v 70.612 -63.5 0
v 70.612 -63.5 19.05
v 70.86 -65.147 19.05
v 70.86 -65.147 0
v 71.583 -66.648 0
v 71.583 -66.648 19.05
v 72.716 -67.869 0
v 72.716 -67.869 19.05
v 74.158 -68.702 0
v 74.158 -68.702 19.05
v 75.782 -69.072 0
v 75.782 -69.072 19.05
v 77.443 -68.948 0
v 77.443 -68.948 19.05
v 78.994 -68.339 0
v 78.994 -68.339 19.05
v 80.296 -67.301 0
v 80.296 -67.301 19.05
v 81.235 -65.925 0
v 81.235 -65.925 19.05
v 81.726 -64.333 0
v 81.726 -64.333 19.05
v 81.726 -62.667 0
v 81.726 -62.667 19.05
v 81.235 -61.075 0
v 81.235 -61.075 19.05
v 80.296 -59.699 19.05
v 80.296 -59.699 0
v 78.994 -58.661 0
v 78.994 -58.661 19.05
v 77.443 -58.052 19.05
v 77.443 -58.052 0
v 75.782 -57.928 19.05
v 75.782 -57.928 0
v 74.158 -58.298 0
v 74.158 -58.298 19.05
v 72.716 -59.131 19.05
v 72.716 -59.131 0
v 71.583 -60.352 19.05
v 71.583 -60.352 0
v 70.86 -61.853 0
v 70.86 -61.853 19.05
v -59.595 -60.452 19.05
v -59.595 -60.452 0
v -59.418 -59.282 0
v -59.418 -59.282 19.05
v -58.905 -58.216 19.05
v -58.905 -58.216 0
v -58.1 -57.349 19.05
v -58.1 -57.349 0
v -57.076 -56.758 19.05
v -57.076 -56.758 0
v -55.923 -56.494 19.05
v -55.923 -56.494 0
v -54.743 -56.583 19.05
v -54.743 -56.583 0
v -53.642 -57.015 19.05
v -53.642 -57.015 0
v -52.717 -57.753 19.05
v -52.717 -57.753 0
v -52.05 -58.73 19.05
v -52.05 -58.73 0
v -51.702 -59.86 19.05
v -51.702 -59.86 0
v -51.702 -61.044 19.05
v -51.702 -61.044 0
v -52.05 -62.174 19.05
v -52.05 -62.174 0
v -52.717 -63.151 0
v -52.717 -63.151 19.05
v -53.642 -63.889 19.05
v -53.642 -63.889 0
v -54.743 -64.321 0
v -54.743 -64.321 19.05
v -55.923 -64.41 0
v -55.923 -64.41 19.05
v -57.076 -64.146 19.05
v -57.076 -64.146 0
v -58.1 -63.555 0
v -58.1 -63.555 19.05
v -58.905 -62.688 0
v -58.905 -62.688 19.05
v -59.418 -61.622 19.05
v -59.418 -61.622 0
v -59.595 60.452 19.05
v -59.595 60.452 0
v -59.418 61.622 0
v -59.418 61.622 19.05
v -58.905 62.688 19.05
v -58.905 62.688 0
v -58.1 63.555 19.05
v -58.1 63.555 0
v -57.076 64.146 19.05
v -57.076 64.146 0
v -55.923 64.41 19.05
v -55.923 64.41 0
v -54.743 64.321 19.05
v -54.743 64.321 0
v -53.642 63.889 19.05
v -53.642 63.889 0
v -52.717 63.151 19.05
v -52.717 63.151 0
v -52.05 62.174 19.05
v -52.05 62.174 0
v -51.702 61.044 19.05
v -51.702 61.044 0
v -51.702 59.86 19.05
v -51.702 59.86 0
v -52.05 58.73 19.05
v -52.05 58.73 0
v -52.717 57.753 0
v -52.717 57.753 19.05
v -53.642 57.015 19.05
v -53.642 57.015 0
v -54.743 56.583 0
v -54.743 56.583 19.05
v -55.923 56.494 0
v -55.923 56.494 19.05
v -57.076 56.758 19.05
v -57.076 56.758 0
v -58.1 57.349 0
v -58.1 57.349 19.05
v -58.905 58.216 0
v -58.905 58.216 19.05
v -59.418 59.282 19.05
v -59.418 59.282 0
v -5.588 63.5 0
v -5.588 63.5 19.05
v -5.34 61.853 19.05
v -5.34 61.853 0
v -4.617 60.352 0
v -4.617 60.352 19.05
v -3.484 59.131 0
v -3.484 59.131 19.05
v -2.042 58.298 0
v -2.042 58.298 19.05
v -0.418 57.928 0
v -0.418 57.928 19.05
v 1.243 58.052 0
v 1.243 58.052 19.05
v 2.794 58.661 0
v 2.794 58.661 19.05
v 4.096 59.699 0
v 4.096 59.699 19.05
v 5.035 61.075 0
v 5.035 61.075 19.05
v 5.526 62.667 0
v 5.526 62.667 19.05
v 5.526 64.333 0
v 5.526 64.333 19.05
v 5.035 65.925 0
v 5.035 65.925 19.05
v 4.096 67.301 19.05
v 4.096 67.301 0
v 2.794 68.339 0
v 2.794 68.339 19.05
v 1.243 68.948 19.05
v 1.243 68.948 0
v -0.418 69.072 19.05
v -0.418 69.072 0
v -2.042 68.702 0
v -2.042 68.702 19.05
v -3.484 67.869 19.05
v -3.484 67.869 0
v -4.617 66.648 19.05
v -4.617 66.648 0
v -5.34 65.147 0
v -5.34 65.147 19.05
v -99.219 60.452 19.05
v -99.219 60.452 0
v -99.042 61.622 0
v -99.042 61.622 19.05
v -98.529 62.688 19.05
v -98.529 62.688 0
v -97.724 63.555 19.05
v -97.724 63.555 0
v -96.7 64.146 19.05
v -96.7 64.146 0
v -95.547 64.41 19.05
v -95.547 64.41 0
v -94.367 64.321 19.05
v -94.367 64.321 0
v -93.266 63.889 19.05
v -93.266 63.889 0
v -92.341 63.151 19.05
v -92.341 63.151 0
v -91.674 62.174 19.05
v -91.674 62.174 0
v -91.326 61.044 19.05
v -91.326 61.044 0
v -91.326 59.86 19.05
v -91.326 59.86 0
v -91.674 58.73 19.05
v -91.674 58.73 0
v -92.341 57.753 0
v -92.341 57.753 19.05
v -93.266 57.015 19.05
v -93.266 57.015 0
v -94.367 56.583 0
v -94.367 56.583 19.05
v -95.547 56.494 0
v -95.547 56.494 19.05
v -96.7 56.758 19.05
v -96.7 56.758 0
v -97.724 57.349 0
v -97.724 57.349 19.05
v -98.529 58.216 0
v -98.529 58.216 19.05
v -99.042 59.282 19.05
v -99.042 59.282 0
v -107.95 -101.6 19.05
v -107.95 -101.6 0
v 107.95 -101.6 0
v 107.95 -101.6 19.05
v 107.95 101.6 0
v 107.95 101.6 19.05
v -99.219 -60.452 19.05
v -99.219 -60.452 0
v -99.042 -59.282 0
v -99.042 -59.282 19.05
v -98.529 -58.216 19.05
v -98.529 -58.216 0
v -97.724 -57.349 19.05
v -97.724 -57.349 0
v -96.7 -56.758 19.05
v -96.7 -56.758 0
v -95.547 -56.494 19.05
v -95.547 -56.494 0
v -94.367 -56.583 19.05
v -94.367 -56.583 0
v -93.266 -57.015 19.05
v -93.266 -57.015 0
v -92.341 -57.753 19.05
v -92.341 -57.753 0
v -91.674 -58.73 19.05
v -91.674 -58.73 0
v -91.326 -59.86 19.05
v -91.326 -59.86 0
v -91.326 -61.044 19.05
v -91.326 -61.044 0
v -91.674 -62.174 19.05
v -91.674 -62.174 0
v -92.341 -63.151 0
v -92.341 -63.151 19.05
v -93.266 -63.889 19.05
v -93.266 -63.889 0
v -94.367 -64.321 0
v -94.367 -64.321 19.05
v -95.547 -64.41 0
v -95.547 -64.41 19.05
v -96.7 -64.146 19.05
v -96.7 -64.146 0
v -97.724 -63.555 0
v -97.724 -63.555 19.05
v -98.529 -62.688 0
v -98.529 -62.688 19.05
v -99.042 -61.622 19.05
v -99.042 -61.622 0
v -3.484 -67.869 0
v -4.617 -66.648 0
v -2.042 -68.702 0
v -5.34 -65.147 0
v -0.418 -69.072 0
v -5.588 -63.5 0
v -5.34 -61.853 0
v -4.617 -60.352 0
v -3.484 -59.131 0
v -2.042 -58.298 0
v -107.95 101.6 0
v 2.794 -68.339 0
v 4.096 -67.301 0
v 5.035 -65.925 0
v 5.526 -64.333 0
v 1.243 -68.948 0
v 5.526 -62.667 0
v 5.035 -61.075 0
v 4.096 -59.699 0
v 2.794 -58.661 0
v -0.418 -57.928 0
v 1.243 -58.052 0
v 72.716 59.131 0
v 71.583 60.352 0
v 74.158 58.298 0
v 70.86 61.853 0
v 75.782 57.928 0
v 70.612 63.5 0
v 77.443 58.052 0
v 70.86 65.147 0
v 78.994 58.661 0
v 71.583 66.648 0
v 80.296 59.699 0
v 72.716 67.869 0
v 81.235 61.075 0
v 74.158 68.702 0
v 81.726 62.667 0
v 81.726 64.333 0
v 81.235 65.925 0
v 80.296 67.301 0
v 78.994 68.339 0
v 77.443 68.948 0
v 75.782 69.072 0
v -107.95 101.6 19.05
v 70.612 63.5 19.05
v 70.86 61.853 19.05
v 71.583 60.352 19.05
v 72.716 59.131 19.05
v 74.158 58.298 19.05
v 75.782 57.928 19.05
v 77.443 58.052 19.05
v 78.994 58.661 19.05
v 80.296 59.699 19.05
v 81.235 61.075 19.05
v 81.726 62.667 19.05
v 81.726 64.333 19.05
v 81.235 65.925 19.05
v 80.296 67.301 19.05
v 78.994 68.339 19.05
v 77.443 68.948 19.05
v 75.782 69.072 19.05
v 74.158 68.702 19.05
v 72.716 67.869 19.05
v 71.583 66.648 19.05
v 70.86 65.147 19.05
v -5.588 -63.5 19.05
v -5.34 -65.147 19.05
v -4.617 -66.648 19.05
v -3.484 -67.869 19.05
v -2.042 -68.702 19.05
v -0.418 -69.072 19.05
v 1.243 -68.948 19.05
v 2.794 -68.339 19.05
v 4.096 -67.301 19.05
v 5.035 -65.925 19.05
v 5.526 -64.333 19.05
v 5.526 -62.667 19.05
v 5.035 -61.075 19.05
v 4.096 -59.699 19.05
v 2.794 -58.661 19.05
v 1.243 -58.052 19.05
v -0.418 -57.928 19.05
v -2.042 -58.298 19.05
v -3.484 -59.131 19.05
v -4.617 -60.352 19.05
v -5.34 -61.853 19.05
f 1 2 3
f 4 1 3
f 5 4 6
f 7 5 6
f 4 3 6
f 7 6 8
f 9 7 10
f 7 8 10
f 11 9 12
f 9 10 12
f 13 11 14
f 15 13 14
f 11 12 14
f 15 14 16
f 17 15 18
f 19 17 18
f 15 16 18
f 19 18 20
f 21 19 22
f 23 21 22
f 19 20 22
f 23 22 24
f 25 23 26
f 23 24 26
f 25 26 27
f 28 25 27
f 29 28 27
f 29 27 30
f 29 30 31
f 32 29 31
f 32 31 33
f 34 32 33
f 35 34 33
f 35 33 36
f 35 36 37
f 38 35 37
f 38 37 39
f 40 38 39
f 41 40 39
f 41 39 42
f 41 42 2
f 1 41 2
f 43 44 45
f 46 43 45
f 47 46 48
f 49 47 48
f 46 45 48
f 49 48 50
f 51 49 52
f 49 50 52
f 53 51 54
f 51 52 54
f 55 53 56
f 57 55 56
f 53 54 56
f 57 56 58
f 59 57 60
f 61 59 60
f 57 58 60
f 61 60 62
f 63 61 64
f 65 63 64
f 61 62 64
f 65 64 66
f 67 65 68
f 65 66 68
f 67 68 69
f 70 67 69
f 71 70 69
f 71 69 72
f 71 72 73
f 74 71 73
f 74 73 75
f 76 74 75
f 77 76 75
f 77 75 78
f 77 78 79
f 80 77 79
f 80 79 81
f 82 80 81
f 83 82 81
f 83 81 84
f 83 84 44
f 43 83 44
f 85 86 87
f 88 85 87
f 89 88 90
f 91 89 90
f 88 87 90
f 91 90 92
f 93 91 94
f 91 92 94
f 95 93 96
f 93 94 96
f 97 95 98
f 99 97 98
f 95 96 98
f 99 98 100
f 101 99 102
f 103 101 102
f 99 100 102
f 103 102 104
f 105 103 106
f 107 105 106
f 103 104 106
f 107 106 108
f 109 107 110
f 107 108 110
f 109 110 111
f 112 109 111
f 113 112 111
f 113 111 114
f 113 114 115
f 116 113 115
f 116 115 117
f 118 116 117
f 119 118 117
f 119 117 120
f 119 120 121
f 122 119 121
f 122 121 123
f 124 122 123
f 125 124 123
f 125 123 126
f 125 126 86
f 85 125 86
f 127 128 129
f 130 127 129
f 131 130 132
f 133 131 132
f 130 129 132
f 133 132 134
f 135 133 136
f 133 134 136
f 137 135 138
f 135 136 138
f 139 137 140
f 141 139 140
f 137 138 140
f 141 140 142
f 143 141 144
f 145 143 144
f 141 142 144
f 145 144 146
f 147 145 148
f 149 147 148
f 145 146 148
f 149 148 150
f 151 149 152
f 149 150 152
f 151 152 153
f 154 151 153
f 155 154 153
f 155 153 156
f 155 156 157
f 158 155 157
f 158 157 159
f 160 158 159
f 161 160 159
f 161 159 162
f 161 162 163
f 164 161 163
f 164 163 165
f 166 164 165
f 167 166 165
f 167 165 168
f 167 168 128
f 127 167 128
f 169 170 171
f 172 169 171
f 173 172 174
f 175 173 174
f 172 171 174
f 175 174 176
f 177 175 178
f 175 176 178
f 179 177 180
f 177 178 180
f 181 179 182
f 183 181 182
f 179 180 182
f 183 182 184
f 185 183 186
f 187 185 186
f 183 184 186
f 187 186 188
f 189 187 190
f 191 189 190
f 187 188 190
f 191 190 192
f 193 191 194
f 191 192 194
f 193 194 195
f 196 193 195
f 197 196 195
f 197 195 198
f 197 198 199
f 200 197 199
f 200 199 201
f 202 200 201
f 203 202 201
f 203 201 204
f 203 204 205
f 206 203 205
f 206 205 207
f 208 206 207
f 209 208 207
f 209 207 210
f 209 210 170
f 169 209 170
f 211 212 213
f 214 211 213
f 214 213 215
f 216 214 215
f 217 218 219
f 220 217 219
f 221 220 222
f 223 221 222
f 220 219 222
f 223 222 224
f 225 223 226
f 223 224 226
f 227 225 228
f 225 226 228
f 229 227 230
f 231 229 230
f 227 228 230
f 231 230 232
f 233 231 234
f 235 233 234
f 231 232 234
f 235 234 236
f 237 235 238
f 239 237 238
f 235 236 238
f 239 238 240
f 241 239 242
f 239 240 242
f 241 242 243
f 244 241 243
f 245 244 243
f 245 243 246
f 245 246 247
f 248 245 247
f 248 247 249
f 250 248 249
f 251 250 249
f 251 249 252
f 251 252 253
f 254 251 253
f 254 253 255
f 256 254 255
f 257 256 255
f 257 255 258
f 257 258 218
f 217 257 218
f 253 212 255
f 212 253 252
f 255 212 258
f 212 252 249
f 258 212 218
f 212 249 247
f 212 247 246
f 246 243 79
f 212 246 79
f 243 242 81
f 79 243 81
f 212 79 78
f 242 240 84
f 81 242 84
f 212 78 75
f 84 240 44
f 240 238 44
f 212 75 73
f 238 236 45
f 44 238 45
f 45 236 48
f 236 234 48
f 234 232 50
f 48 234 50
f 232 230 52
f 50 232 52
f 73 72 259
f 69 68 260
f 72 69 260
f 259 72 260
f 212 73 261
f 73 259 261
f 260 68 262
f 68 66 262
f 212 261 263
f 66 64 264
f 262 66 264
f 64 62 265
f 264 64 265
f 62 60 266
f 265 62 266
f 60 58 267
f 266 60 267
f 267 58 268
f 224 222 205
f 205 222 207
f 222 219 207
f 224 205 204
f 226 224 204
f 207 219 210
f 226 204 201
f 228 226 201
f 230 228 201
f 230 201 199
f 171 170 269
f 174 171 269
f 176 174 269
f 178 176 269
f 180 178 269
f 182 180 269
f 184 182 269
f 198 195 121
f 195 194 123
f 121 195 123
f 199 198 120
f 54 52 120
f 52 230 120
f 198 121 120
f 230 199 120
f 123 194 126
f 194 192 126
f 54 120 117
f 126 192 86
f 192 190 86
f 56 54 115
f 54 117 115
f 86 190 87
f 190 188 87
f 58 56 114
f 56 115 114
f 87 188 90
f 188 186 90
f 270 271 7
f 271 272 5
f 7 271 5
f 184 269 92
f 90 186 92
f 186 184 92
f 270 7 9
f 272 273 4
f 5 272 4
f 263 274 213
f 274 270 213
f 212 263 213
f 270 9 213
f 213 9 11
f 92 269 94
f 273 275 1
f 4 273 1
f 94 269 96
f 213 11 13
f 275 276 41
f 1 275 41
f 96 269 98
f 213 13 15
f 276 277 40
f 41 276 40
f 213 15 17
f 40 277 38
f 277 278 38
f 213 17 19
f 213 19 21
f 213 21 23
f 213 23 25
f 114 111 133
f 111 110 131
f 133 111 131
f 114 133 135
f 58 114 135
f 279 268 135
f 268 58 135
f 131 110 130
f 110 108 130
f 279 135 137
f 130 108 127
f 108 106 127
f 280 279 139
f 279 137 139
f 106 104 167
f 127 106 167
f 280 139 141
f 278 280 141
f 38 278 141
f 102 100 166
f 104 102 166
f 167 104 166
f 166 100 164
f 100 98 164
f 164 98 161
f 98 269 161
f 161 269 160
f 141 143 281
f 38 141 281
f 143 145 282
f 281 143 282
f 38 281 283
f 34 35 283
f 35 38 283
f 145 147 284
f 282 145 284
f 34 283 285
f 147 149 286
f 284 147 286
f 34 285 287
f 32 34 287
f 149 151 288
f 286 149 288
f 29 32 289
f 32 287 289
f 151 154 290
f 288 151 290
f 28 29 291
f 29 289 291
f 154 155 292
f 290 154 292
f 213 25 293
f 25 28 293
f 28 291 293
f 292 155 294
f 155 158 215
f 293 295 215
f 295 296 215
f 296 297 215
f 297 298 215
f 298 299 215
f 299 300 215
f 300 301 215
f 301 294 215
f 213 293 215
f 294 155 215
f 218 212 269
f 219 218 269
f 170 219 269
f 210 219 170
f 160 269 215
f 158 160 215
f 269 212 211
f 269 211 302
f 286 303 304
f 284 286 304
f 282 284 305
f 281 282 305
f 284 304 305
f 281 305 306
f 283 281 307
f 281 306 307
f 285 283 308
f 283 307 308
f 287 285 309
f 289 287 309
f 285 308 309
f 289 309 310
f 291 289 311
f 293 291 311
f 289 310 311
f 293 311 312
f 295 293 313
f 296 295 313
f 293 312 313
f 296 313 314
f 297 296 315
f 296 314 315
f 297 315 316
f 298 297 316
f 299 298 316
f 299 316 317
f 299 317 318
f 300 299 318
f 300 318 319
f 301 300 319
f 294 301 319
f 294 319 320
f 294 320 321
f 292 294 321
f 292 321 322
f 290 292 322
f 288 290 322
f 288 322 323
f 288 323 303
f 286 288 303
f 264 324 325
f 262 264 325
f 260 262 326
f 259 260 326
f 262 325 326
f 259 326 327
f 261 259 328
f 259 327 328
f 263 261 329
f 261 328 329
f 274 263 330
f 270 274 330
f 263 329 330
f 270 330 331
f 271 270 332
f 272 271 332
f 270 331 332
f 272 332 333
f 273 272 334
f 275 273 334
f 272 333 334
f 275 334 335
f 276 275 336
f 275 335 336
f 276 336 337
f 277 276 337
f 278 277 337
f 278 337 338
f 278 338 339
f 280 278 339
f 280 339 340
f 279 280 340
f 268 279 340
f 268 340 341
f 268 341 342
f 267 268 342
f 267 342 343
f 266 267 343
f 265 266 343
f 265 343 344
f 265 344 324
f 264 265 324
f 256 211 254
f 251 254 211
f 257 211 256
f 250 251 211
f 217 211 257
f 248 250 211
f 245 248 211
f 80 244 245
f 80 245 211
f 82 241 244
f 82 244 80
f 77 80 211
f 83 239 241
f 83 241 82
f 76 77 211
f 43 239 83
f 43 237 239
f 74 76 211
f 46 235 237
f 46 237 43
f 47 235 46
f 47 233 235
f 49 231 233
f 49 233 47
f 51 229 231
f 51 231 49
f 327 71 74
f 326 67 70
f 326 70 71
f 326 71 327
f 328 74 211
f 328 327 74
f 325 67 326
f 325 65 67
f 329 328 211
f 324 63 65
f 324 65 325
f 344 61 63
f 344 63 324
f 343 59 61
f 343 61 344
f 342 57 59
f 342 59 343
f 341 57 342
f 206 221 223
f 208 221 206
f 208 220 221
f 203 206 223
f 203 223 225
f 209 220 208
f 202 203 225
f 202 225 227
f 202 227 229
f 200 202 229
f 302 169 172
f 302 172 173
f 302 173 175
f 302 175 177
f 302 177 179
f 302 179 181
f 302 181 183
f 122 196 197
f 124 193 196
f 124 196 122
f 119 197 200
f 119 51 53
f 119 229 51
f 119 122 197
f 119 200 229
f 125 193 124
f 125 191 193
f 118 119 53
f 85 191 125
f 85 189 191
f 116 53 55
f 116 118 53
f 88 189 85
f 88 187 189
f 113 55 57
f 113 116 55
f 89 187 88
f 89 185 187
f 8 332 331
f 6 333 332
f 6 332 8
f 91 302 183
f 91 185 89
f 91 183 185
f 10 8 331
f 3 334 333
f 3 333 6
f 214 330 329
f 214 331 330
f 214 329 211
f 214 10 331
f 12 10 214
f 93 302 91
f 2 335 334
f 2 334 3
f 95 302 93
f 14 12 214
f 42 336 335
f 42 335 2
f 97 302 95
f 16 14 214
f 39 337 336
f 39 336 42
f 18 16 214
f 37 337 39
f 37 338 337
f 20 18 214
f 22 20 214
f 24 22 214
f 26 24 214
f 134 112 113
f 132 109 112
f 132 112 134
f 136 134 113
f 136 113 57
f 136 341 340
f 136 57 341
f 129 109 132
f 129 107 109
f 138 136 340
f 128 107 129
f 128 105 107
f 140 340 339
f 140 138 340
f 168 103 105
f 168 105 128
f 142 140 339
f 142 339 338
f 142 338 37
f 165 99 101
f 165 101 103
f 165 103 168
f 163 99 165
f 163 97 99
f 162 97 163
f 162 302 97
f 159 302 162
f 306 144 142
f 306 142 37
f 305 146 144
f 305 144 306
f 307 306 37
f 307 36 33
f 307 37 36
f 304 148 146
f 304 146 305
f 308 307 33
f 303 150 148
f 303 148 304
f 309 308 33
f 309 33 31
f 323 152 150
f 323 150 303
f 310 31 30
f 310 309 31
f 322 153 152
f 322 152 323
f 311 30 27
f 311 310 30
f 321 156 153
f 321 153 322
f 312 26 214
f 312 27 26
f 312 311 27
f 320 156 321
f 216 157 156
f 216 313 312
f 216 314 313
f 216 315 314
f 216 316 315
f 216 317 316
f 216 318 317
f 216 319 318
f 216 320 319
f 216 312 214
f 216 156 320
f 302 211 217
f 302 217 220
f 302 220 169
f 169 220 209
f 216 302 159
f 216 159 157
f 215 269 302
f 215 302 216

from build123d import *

# Parameters (mm, degrees)
F0_W     = 215.9
F0_H     = 203.2
F1_DEPTH = 19.05
F2_D     = 11.176
F4_D     = 7.9375


with BuildPart() as f1:
    # F0 (on Top) → F1 (new body)
    with BuildSketch(Plane.XY):
        Rectangle(F0_W, F0_H)
    extrude(amount=F1_DEPTH)

    # F2 (through all)
    with Locations(Plane(origin=(0, 0, 0), x_dir=(1, 0, 0), z_dir=(0, 0, -1))):
        with Locations((0, -63.5), (76.2, -63.5), (0, 63.5), (76.2, 63.5)):
            Hole(F2_D / 2)

    # F4 (through all)
    with Locations(Plane.XY.offset(19.05)):
        with Locations((-95.25, 60.452), (-55.626, 60.452), (-95.25, -60.452), (-55.626, -60.452)):
            Hole(F4_D / 2)


solid = f1.part
